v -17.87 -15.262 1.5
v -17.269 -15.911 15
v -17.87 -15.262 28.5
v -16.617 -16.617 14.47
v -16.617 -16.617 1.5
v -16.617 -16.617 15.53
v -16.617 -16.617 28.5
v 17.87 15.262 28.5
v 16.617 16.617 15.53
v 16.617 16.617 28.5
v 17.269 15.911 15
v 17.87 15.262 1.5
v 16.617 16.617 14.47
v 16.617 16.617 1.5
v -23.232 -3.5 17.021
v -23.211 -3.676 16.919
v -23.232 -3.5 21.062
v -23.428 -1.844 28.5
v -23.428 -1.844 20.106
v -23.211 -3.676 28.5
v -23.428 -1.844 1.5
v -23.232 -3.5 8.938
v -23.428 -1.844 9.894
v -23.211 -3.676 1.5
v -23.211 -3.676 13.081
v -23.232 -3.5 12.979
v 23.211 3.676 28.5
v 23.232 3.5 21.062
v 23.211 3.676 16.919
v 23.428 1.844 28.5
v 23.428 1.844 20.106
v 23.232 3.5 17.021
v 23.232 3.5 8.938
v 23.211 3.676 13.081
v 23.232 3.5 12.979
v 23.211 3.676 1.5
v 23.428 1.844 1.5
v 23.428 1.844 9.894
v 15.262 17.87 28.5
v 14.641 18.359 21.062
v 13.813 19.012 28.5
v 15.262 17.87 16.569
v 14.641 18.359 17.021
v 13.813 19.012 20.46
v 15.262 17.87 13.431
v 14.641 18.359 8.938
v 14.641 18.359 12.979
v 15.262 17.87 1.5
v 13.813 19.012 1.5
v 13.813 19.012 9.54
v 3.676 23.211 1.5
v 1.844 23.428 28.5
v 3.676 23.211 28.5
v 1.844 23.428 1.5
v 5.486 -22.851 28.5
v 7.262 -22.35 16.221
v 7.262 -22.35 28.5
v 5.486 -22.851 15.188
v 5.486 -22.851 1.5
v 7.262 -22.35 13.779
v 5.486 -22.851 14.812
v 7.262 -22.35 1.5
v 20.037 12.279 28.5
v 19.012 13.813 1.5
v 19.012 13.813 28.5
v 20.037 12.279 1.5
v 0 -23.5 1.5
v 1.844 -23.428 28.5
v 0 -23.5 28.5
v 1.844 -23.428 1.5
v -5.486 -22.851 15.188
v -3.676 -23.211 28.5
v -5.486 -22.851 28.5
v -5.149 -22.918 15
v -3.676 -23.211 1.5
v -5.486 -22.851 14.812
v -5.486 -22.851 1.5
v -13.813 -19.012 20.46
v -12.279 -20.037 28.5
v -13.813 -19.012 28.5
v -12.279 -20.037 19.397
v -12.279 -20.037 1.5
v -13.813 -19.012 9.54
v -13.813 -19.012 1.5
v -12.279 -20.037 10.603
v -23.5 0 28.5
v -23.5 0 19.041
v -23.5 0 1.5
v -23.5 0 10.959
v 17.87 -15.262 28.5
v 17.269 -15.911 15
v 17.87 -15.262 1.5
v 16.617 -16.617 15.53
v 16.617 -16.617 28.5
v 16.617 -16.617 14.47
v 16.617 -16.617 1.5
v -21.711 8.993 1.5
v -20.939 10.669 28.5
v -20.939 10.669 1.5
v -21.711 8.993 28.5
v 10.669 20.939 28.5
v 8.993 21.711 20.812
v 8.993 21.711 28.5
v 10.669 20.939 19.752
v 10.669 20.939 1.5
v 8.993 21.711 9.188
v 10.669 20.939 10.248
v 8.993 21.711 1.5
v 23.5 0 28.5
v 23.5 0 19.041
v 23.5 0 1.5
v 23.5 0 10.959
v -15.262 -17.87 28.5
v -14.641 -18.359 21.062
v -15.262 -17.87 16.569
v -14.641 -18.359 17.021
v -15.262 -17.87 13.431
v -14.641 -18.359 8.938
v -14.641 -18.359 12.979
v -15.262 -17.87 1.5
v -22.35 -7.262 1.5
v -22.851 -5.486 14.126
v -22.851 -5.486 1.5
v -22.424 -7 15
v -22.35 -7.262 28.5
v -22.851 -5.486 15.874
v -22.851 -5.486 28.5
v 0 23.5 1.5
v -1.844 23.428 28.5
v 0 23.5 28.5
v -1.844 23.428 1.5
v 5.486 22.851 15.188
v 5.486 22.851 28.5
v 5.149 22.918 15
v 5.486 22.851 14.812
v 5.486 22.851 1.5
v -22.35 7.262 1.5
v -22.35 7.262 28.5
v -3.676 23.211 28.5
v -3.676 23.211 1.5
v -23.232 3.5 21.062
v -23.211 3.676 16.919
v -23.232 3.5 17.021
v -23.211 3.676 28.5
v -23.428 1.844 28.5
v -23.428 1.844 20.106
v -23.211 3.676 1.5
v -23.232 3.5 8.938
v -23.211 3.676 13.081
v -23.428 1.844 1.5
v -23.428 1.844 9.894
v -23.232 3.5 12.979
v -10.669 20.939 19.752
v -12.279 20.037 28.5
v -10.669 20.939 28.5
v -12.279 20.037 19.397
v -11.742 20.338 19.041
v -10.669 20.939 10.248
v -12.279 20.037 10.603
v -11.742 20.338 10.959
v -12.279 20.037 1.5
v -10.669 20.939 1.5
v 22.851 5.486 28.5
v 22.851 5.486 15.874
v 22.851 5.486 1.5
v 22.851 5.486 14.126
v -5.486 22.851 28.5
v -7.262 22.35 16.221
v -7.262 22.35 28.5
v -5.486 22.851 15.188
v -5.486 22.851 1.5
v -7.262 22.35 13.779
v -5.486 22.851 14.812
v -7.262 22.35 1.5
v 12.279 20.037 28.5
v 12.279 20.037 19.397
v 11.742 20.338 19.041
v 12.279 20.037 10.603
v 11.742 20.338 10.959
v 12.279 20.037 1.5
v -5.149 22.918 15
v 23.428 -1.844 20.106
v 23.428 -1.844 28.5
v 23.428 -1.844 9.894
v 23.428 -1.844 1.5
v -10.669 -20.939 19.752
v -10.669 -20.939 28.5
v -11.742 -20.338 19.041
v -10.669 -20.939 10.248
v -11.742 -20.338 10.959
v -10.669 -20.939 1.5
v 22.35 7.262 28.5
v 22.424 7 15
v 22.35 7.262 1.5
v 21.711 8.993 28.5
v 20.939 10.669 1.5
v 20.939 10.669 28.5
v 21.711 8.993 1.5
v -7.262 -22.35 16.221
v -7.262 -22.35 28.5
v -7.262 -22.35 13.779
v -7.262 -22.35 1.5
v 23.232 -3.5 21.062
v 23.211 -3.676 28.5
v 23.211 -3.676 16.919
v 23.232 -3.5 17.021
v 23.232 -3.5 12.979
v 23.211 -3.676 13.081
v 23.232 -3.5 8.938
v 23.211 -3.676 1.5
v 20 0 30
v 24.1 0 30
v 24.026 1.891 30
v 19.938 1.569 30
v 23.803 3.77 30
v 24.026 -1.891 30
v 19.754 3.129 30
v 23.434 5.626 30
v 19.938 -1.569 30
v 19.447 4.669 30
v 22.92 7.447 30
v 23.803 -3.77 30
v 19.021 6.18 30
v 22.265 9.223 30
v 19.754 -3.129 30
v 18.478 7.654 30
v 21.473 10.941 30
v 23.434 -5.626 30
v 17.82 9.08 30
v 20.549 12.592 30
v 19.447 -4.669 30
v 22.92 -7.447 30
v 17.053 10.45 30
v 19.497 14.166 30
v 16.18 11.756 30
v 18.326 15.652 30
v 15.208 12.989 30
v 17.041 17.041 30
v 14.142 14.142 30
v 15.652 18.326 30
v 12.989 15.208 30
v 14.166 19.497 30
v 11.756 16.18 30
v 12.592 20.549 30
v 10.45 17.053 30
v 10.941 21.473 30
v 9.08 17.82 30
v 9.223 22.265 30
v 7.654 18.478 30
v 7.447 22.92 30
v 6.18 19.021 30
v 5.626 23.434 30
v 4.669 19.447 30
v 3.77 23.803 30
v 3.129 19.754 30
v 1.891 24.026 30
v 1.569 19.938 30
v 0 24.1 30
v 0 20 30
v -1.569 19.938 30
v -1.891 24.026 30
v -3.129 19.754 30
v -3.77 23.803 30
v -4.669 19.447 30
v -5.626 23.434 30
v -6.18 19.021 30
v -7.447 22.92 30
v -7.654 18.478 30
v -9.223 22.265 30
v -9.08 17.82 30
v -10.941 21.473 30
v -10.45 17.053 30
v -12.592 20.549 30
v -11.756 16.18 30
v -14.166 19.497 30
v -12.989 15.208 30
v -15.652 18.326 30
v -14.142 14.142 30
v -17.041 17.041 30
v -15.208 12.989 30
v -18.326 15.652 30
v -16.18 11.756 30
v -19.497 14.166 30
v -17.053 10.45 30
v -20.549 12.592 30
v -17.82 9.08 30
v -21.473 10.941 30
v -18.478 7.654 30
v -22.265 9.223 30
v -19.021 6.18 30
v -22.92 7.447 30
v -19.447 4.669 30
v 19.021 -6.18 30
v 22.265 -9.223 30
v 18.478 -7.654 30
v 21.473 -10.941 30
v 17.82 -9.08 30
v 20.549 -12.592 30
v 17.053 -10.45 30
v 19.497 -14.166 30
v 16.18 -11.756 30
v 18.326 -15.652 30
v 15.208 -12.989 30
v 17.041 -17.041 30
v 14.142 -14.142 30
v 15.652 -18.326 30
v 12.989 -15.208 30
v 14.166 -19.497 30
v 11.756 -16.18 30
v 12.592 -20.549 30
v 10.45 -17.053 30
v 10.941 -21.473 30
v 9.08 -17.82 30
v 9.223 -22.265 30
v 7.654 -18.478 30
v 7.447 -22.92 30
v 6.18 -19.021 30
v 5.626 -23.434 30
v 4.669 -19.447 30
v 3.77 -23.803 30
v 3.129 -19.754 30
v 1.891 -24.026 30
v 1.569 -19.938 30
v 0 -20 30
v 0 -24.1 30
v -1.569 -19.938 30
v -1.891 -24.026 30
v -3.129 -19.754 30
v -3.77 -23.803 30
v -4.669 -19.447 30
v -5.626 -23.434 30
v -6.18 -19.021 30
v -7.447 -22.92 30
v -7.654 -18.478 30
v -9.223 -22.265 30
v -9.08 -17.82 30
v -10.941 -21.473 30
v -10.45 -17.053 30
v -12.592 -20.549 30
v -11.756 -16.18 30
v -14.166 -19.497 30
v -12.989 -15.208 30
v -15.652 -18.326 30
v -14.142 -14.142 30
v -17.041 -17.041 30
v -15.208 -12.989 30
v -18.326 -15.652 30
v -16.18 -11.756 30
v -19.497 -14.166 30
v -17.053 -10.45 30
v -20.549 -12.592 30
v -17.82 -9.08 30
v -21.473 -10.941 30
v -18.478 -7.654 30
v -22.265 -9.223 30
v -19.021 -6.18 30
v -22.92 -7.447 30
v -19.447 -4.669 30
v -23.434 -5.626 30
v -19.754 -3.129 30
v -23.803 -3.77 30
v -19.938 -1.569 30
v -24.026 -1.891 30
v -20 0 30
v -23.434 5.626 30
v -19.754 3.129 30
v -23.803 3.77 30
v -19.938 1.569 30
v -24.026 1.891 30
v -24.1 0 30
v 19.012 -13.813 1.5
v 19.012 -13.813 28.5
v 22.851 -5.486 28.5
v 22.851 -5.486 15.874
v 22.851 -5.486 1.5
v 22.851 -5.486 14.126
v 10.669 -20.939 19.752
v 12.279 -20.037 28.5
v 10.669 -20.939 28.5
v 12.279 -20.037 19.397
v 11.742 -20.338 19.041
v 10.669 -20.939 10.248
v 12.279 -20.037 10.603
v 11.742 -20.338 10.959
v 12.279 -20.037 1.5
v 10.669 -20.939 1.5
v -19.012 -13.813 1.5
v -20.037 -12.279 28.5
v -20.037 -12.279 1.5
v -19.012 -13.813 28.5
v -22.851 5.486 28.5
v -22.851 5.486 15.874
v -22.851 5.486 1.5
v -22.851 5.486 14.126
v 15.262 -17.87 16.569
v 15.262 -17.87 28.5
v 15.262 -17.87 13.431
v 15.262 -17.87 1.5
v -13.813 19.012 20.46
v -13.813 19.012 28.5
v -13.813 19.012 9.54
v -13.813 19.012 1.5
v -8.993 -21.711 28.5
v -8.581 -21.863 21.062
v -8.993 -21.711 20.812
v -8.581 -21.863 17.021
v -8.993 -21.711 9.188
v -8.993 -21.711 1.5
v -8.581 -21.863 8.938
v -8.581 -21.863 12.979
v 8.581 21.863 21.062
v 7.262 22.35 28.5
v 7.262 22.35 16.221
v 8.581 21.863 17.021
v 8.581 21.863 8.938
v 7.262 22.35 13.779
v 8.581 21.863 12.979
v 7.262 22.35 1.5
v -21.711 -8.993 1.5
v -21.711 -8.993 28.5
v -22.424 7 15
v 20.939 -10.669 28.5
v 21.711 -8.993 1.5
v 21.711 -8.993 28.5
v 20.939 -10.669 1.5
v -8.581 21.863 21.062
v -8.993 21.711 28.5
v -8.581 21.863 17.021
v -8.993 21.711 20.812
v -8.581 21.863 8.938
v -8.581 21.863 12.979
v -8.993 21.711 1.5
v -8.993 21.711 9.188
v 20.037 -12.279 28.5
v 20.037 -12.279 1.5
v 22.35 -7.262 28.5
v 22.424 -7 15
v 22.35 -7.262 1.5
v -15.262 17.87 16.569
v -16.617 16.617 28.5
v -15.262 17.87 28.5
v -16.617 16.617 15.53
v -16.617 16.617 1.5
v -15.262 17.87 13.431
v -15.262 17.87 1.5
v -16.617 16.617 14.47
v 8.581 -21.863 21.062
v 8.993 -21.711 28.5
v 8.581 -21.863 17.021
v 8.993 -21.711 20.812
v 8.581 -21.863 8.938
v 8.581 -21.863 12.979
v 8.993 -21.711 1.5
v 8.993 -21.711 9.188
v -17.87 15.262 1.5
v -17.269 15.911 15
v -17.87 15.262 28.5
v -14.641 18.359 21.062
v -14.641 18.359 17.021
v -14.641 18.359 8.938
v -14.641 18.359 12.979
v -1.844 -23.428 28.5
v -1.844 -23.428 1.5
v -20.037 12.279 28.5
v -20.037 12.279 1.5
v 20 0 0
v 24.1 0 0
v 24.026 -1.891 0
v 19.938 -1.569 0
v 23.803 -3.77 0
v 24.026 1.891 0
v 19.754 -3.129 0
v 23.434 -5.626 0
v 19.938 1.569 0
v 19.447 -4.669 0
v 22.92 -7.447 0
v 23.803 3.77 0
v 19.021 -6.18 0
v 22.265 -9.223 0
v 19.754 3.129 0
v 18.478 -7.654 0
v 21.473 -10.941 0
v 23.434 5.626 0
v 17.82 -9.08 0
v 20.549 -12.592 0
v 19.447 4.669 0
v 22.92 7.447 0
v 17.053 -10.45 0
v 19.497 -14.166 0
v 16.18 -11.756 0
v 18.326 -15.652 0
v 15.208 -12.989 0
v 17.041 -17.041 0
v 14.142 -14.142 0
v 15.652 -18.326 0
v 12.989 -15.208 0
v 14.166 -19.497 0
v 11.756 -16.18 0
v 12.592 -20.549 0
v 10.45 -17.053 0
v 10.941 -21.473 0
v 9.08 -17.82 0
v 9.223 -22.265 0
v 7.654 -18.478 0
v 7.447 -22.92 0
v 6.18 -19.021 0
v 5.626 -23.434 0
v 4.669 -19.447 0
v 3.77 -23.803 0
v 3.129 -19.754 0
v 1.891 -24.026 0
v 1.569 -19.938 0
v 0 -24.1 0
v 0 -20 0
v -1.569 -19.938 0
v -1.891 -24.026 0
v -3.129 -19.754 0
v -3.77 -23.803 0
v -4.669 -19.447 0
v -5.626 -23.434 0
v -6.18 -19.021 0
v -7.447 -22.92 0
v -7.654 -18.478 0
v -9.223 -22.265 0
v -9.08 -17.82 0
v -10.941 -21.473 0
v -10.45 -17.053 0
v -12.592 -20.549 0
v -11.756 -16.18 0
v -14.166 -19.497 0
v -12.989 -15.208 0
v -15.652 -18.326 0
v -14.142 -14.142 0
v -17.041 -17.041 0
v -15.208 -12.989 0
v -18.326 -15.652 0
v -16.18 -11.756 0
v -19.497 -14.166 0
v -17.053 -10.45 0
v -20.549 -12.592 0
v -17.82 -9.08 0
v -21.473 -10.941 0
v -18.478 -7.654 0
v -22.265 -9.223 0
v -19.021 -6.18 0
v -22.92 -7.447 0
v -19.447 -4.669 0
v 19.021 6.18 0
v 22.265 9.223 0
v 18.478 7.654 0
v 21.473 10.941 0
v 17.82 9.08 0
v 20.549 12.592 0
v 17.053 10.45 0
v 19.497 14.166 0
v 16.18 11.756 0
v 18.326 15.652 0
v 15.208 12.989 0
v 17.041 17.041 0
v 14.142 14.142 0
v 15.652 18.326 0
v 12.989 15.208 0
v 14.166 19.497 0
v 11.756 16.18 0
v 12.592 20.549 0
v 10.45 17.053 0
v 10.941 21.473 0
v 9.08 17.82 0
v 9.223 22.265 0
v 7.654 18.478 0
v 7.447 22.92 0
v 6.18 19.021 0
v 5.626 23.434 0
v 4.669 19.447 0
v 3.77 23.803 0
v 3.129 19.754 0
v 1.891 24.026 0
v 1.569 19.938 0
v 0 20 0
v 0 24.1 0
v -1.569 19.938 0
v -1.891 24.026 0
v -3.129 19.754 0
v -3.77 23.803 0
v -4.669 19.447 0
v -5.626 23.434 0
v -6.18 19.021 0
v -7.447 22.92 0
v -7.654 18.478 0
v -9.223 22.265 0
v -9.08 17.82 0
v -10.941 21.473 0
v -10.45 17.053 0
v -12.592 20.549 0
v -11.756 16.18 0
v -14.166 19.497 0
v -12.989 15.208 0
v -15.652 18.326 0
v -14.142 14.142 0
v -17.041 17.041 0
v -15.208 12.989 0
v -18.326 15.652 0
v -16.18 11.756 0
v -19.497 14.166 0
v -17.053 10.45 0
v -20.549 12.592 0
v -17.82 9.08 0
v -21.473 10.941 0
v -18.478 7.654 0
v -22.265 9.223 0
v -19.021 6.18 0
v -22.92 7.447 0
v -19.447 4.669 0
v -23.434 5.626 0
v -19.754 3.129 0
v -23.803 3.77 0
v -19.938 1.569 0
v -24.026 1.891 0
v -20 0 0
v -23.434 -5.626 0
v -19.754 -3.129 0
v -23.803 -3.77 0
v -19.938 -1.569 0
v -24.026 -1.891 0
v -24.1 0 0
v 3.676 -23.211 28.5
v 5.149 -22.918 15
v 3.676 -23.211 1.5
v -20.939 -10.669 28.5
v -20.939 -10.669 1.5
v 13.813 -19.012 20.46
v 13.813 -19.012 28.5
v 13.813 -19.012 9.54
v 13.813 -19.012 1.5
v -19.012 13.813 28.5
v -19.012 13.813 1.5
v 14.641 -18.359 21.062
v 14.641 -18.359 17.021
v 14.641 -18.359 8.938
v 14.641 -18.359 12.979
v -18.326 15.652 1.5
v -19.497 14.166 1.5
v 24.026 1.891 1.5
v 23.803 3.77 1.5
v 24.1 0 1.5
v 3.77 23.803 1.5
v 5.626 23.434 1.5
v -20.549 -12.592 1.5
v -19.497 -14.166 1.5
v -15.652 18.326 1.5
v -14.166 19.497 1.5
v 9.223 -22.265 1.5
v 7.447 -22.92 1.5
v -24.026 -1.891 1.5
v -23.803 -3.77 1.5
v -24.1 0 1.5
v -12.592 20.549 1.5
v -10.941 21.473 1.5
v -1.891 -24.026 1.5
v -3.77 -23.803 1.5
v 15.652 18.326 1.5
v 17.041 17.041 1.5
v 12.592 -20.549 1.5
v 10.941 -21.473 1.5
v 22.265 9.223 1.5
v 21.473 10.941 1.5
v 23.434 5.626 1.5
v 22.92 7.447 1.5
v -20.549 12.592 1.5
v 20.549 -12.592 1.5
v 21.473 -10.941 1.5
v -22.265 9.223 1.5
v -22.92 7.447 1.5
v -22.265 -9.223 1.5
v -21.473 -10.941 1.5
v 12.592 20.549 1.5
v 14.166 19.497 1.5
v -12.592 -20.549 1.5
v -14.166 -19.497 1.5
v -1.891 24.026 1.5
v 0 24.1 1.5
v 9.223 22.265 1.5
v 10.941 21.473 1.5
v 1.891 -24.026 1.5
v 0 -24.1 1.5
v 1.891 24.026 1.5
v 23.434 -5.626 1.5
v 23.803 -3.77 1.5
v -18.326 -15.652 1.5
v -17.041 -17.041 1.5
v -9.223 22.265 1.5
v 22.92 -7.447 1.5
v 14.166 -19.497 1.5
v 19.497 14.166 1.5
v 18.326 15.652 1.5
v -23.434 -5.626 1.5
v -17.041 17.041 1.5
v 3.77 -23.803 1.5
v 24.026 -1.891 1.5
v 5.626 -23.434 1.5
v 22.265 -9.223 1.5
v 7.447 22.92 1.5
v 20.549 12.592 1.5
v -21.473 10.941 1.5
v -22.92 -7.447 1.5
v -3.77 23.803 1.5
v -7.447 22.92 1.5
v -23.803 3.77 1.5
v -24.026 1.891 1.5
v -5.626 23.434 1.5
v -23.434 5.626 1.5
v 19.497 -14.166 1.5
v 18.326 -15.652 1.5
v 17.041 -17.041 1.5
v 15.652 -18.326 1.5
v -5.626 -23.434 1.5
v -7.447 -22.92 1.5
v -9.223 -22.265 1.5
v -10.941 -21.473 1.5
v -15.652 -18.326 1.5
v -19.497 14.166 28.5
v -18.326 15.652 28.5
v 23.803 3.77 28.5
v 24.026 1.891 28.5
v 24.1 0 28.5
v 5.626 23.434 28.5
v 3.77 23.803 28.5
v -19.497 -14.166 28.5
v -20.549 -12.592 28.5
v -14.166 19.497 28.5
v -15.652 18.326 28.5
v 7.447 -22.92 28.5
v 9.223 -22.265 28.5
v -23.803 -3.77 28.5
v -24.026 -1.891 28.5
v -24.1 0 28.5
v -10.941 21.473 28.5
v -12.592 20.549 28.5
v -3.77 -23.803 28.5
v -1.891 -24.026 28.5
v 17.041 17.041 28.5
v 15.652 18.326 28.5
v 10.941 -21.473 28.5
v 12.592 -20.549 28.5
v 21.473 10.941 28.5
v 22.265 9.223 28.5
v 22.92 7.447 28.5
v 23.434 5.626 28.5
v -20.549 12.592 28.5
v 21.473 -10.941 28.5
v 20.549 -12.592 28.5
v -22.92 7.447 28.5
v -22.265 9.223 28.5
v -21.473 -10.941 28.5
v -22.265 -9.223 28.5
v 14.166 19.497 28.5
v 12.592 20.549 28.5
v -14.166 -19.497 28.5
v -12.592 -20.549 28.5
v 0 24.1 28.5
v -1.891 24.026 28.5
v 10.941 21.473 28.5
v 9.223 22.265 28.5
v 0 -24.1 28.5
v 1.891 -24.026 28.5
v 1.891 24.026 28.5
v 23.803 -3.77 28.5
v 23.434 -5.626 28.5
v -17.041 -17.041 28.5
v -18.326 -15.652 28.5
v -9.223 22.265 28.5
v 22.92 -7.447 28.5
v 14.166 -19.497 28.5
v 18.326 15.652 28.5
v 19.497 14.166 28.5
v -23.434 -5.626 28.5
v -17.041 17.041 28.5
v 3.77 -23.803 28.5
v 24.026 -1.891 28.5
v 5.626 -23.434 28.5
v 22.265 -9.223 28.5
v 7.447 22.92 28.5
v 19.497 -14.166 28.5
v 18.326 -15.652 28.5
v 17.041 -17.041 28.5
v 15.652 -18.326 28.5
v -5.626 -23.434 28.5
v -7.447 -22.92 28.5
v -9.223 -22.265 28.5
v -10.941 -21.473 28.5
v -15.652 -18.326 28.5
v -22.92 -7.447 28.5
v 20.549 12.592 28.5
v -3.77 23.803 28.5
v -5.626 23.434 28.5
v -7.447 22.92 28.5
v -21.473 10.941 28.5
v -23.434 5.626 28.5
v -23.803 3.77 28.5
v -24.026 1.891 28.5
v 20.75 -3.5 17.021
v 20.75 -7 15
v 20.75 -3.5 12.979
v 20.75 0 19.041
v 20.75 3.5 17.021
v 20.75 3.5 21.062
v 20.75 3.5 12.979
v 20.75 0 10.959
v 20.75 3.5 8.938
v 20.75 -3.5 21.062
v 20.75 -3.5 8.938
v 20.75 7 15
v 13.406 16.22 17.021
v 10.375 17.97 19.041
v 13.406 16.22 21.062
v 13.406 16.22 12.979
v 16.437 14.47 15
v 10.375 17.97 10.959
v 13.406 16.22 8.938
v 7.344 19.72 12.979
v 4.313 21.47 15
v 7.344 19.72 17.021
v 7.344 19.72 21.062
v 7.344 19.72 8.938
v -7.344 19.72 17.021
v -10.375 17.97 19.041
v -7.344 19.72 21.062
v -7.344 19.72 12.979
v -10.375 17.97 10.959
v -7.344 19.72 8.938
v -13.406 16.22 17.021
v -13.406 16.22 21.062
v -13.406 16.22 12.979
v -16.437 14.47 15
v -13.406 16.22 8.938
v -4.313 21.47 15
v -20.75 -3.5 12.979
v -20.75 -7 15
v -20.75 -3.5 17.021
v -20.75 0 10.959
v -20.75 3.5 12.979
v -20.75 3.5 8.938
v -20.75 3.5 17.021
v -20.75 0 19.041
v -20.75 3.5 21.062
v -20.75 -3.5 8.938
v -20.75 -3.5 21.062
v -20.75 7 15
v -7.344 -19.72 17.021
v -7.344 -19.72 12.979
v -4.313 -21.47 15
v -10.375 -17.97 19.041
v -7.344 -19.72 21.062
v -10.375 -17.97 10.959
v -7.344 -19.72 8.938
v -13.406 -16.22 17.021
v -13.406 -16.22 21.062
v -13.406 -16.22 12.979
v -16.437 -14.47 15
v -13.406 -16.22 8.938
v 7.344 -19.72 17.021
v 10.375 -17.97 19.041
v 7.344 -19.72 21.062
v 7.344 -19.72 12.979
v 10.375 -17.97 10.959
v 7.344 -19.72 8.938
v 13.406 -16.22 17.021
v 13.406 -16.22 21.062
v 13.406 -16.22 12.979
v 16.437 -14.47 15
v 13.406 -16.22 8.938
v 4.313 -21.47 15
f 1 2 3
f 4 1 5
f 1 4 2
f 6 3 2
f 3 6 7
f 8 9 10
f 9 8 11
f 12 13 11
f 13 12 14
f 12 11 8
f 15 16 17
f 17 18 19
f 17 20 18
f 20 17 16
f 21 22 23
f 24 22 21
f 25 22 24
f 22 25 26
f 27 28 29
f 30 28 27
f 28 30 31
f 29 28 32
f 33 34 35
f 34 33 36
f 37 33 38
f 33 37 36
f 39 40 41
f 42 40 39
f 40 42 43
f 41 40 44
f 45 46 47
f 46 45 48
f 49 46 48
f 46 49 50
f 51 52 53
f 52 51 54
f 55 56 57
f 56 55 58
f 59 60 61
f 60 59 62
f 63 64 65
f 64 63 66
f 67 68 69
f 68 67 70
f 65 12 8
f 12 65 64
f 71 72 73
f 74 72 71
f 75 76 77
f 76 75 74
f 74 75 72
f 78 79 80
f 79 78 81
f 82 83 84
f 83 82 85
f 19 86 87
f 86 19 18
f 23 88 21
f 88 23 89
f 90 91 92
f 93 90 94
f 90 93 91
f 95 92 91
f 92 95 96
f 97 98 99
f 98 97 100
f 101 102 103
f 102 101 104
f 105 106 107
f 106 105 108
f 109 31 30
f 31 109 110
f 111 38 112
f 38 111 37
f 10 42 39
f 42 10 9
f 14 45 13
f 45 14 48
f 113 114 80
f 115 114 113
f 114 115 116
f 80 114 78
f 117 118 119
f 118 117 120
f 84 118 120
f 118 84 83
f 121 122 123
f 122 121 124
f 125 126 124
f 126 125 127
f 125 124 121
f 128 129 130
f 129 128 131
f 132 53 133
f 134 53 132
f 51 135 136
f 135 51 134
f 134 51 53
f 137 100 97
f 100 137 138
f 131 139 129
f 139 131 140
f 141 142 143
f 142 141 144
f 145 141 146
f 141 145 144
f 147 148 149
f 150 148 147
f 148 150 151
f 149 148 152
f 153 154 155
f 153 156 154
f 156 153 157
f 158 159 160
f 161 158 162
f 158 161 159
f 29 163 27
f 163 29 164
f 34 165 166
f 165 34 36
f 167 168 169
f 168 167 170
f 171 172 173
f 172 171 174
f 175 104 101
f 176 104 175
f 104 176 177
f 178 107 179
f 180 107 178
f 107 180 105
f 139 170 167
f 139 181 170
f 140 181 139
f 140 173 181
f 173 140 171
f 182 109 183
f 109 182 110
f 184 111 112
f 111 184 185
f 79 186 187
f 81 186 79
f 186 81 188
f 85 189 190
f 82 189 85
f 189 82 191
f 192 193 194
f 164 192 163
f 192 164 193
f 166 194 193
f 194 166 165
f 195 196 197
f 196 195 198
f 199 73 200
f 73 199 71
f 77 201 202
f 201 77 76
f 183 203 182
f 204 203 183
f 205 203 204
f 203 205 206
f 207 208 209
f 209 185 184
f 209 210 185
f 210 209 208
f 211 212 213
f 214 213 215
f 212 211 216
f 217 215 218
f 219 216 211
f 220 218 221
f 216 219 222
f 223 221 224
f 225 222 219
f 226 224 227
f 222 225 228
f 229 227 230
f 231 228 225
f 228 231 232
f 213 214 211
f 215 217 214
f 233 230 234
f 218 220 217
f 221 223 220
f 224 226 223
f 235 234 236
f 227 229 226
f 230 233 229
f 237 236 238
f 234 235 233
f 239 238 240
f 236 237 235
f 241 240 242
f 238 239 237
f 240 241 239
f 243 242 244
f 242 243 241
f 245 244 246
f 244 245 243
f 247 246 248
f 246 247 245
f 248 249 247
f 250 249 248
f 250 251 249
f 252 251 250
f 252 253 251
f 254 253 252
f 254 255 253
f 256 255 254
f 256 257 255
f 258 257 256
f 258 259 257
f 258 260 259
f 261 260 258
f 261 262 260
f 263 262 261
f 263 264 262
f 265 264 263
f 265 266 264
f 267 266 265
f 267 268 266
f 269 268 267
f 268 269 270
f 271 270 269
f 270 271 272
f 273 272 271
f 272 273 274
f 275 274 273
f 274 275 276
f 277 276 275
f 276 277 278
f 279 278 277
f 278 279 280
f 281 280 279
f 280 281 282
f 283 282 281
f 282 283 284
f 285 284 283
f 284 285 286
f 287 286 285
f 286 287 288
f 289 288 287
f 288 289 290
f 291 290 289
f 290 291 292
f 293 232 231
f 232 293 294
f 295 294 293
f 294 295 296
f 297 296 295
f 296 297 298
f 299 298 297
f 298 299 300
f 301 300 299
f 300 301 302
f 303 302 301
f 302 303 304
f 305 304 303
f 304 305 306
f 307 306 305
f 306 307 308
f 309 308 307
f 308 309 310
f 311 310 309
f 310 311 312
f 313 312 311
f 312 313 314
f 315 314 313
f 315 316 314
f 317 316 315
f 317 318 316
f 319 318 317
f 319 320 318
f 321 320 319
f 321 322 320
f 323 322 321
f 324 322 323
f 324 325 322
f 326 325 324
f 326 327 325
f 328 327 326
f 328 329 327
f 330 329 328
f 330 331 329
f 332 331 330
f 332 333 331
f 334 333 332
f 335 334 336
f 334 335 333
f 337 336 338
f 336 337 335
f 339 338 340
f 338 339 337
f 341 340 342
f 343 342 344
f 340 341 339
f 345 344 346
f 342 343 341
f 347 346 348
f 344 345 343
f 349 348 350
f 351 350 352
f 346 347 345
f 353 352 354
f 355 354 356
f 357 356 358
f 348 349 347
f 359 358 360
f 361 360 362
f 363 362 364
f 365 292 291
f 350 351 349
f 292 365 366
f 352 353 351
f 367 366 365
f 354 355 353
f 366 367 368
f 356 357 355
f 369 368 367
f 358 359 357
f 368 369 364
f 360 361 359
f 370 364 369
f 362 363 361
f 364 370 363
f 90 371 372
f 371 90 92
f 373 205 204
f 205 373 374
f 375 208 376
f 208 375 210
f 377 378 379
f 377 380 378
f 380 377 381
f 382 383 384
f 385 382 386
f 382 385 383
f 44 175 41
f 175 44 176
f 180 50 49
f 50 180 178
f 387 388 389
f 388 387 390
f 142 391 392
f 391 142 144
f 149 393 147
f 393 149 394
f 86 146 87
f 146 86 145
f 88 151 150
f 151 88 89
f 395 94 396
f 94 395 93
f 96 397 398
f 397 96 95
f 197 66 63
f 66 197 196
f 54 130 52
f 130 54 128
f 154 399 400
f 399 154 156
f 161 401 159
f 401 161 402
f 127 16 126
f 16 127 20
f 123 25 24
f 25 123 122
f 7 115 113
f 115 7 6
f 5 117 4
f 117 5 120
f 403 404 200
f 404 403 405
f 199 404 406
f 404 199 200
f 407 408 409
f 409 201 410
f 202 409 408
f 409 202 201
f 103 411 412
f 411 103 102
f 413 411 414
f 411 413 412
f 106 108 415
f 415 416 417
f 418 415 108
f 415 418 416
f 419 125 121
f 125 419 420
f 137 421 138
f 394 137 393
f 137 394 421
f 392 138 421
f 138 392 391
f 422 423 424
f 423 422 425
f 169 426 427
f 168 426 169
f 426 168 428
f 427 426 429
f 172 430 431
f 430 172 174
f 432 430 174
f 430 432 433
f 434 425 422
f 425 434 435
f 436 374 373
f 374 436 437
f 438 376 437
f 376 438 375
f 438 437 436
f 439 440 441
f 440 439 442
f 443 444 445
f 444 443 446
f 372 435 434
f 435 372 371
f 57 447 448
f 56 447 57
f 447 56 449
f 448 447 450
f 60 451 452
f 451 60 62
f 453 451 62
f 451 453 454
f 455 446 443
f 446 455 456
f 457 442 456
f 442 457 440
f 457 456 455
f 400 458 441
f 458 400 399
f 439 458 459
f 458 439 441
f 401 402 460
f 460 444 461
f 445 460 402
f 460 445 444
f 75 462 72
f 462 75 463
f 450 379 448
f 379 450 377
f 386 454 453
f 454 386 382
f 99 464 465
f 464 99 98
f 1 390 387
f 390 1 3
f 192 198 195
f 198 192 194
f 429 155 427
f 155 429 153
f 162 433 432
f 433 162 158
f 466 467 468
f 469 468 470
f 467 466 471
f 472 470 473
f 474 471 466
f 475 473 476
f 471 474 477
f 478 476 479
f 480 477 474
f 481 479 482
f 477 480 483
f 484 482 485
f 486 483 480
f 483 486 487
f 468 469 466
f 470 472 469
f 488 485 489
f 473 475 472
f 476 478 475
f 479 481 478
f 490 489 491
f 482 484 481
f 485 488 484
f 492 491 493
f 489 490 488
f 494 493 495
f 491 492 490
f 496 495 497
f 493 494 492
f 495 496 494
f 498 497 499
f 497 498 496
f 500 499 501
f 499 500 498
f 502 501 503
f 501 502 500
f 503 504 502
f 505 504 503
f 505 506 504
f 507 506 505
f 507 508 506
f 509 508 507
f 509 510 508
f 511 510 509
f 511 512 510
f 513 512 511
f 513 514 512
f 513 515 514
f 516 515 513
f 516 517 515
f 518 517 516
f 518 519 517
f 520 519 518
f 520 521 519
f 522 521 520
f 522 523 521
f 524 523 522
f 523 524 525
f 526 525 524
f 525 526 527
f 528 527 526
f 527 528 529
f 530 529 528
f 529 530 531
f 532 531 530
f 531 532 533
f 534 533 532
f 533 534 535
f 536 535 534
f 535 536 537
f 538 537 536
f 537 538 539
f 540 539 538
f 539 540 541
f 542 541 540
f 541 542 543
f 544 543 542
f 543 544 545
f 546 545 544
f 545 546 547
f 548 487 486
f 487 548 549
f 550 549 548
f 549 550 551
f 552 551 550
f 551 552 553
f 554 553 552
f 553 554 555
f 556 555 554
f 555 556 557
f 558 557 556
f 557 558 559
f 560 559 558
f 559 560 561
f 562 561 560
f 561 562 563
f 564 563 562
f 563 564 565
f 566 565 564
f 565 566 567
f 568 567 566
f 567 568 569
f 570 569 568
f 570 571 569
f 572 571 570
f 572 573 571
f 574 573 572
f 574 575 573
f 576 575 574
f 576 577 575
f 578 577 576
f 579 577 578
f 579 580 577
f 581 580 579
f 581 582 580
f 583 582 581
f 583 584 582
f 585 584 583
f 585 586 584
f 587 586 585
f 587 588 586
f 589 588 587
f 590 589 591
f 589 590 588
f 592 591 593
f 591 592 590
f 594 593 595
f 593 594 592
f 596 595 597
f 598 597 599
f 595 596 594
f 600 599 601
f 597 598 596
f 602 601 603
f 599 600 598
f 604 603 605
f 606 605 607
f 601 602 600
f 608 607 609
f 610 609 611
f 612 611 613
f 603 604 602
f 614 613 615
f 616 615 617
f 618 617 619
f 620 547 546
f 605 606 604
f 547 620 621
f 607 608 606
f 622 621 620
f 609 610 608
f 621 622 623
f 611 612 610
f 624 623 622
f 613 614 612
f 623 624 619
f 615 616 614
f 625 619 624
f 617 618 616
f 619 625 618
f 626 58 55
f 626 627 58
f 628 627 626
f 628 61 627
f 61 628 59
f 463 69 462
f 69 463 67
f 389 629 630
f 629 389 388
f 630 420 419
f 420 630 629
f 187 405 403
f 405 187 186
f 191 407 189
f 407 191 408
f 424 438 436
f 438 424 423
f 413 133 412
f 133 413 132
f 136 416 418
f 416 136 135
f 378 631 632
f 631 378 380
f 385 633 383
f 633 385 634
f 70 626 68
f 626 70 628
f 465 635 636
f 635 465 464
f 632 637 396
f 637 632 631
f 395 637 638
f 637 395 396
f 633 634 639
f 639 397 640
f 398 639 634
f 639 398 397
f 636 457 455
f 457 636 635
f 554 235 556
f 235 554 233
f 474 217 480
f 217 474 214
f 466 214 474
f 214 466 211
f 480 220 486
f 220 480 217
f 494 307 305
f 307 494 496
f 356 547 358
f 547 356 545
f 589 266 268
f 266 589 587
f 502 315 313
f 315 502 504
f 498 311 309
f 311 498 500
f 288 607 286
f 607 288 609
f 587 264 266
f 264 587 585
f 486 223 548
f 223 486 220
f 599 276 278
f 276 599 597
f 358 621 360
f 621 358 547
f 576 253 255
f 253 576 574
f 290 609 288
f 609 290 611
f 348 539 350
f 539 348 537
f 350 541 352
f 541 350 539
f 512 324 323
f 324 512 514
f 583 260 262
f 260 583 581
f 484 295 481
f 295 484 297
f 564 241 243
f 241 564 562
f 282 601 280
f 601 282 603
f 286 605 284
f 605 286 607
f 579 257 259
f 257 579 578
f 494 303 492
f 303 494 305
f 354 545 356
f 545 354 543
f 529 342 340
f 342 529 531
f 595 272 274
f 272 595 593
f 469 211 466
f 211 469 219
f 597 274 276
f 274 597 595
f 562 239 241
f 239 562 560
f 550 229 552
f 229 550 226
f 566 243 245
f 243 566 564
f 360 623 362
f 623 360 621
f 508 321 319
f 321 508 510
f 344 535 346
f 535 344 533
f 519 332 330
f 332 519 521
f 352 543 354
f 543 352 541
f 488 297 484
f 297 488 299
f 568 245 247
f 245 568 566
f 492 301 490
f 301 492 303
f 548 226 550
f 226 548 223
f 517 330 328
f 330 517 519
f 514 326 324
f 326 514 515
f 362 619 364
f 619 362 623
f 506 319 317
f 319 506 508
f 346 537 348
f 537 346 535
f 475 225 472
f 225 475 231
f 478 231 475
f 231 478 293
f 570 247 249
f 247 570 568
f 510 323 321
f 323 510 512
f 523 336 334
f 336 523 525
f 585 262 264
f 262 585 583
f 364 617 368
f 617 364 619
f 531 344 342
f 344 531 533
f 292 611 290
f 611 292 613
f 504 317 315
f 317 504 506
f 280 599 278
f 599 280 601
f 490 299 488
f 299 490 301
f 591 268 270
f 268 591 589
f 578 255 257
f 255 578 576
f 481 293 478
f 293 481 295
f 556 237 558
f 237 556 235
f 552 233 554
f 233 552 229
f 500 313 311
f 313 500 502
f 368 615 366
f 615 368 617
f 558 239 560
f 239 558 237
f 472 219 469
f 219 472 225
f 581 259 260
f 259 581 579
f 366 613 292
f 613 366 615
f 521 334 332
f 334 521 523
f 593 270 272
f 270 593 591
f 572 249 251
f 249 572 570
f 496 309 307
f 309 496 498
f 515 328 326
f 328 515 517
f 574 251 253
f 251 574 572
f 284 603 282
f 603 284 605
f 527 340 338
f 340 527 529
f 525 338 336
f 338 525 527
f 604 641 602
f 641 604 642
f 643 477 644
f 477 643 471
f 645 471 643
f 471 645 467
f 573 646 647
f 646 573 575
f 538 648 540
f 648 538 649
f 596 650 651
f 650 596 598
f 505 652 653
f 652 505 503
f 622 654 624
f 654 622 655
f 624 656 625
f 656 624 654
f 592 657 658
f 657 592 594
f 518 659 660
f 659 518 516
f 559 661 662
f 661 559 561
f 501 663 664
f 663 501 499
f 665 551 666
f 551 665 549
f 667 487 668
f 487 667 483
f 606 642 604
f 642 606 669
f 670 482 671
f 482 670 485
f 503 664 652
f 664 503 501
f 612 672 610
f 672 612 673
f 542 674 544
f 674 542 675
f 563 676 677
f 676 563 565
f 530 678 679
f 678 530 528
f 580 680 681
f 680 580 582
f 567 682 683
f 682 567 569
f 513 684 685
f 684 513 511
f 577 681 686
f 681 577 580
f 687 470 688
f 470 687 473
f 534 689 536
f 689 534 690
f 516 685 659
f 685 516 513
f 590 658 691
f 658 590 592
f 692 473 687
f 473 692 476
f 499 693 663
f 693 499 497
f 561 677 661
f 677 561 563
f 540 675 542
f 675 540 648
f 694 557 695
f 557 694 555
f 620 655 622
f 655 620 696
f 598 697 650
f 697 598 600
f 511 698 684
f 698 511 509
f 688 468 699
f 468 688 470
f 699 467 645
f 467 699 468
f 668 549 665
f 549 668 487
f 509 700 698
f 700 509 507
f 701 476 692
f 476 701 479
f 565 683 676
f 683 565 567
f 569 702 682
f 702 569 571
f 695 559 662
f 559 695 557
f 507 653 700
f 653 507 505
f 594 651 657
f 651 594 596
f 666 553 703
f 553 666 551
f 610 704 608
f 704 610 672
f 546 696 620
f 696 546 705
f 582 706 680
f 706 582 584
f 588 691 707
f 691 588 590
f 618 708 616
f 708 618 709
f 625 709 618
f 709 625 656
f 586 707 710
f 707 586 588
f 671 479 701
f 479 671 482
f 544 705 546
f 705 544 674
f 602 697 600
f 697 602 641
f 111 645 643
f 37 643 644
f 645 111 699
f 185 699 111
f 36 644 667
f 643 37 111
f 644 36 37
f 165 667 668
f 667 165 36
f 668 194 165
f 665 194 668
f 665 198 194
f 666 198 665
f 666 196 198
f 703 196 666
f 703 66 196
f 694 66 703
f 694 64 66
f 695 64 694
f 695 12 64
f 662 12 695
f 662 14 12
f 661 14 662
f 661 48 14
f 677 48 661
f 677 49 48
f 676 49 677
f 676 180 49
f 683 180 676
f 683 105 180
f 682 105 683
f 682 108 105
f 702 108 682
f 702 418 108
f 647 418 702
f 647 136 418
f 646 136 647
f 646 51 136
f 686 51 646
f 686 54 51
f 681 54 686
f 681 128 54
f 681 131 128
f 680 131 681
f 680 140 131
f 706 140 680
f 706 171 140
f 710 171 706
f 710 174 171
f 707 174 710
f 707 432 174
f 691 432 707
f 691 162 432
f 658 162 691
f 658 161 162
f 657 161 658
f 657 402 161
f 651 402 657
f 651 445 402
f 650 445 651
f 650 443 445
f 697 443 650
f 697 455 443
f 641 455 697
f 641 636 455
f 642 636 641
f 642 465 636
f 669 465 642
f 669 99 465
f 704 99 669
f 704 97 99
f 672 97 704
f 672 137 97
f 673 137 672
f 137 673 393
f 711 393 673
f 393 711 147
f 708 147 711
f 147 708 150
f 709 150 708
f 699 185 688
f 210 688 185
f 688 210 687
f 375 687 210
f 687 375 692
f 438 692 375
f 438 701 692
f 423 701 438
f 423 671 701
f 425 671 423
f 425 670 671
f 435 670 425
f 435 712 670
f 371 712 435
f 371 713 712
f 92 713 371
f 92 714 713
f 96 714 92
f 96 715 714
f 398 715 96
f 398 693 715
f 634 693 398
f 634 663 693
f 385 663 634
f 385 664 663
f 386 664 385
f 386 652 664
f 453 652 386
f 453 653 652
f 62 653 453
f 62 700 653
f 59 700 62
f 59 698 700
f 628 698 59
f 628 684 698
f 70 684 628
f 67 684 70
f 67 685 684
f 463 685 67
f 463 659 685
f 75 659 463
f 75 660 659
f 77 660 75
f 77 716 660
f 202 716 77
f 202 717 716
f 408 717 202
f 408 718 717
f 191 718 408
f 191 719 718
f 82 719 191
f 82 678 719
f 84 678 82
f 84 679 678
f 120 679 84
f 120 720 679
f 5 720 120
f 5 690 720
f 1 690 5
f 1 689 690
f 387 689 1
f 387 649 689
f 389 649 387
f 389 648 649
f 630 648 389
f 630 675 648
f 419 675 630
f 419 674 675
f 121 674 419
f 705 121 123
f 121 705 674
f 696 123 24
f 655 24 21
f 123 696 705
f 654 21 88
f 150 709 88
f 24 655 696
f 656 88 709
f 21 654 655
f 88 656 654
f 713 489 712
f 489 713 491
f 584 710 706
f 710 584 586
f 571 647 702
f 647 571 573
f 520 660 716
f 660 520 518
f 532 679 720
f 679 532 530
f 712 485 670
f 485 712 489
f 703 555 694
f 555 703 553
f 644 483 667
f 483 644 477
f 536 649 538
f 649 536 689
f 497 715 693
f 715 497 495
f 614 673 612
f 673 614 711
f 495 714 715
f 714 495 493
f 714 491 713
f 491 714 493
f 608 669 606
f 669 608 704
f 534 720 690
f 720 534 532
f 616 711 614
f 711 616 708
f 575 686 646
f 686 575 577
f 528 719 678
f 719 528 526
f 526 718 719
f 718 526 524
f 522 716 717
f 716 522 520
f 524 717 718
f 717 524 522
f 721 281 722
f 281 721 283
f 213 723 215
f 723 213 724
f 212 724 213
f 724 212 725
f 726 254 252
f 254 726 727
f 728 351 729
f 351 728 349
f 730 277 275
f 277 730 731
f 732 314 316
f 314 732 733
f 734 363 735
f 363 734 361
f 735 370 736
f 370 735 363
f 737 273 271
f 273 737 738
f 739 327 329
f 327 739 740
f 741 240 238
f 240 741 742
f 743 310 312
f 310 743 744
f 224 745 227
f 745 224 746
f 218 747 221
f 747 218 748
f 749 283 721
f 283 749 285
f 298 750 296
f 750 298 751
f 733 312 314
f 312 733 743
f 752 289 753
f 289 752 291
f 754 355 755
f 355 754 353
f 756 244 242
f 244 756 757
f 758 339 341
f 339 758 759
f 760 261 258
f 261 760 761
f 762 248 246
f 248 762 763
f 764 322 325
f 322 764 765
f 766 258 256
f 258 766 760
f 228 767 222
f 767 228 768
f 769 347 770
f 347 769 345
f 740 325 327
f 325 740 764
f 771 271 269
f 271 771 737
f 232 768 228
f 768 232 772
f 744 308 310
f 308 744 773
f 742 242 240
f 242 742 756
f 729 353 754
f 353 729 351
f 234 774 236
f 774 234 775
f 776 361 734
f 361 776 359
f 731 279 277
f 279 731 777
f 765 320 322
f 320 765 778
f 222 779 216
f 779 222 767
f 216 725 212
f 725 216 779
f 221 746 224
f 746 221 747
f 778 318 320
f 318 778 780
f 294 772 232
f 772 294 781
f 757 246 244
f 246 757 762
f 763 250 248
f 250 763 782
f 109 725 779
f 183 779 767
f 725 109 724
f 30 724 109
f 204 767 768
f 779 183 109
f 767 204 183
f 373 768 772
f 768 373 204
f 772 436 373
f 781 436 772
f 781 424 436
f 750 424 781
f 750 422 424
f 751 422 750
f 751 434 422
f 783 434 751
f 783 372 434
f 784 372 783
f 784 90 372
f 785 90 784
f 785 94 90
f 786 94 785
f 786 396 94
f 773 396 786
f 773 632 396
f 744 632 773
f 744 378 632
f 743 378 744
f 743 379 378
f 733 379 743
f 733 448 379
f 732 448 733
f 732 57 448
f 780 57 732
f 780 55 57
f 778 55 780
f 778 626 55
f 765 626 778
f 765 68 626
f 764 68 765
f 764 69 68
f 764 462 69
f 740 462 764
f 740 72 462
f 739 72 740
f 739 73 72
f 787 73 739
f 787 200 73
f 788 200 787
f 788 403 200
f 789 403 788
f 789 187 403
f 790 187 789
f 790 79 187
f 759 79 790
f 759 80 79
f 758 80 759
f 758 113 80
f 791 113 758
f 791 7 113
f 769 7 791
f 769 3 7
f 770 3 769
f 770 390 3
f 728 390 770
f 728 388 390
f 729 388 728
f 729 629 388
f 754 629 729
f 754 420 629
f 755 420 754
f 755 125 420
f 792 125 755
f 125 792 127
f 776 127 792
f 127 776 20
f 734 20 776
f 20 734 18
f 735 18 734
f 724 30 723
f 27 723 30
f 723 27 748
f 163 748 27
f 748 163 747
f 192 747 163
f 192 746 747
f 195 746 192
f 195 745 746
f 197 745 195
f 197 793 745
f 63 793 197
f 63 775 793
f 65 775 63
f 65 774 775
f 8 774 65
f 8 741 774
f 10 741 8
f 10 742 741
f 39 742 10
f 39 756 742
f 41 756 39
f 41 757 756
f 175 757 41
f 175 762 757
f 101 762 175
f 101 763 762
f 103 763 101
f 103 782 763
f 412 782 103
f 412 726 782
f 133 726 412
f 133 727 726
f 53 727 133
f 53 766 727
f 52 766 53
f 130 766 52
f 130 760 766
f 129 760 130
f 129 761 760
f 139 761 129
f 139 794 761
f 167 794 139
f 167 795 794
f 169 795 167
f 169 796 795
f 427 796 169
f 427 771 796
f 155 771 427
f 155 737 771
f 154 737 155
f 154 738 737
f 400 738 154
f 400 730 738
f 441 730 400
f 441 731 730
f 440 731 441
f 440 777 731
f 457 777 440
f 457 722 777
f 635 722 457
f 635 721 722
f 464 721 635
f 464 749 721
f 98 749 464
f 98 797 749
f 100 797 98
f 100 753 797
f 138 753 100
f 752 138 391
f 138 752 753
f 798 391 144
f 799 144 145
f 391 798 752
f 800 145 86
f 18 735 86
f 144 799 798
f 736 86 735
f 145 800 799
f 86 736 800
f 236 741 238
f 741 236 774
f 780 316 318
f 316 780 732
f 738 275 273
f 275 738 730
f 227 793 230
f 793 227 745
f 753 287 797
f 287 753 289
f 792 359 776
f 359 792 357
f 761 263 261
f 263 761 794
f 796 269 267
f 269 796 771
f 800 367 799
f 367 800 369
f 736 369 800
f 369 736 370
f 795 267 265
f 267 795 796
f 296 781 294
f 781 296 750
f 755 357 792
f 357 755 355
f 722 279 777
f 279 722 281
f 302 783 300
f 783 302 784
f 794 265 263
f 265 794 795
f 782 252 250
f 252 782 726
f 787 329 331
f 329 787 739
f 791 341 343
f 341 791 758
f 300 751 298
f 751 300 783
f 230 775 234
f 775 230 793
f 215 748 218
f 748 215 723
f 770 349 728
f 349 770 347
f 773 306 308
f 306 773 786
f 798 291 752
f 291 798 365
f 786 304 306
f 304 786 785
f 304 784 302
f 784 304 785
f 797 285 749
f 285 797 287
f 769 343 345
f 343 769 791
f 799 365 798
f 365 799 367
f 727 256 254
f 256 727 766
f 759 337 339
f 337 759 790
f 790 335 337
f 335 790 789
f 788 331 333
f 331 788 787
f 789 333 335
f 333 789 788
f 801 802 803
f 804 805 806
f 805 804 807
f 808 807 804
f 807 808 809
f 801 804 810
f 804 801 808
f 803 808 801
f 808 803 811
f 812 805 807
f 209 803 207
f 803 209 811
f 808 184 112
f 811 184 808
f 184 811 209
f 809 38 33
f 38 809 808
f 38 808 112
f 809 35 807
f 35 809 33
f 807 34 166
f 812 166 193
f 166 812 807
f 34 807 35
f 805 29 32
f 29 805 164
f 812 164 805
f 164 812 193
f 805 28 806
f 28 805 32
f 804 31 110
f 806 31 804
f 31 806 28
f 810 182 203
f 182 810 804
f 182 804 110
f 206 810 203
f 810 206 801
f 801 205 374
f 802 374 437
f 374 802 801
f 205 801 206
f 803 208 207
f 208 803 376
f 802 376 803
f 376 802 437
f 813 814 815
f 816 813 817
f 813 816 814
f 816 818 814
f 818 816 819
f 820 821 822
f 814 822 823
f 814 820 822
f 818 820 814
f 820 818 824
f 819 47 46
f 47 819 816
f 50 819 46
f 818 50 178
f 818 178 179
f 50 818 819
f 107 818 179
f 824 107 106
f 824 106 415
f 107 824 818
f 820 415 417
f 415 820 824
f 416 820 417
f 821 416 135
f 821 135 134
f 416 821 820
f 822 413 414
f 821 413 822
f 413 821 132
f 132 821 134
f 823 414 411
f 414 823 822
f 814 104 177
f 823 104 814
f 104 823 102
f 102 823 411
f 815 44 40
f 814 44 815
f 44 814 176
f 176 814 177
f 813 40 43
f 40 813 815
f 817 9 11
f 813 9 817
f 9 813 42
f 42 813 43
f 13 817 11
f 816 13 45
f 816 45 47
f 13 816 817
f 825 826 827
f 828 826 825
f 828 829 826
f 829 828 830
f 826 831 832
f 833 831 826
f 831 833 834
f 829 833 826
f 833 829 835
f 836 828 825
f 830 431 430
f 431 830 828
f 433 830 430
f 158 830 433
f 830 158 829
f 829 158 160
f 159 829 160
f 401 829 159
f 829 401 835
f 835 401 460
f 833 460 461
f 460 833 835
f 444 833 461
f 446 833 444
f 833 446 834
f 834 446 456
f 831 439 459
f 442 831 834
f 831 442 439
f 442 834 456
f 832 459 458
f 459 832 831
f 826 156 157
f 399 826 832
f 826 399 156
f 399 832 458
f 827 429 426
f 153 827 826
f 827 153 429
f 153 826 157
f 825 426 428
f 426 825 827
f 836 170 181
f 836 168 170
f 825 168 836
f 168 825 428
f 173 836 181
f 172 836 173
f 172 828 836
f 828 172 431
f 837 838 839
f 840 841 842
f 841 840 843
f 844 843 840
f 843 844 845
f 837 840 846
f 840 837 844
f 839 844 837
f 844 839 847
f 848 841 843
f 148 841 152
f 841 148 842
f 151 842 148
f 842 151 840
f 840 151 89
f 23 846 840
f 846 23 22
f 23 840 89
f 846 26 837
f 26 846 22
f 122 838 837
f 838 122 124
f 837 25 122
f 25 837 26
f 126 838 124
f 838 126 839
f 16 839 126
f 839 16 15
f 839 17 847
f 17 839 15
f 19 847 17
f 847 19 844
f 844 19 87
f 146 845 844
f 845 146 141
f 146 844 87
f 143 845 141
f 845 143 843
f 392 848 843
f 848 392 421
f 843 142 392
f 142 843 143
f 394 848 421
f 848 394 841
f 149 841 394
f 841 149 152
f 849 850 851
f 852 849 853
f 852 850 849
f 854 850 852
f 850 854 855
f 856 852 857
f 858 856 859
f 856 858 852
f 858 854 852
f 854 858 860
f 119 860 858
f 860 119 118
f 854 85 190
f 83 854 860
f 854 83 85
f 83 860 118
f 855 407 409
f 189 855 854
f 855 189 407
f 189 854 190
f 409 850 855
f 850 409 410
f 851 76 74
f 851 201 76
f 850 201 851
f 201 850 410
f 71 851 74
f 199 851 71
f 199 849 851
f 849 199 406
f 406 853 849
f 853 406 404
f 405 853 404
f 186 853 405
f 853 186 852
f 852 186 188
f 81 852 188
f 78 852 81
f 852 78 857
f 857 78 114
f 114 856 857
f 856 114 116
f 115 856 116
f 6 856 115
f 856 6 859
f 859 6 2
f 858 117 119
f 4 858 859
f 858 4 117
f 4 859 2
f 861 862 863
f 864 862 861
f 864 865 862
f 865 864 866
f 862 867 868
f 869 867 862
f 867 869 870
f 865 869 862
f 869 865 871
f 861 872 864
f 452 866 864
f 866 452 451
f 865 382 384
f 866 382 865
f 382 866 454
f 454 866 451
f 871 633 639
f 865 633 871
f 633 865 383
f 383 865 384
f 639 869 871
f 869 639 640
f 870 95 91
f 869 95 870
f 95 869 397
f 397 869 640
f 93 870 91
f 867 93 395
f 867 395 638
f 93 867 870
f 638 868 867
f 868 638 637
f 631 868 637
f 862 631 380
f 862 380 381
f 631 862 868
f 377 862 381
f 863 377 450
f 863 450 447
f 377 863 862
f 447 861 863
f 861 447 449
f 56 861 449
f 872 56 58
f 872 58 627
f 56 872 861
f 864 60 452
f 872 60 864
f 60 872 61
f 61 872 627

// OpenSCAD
// Passover Star of David Napkin Ring
// A napkin ring with Star of David cutouts around the band

$fn = 80;

// Napkin ring parameters
ring_inner_d = 40;
ring_height = 30;
ring_wall = 3.5;

module napkin_ring_base() {
    difference() {
        cylinder(d = ring_inner_d + 2 * ring_wall, h = ring_height);
        translate([0, 0, -1])
            cylinder(d = ring_inner_d, h = ring_height + 2);
    }
}

// 2D Star of David (two overlapping triangles)
module star_of_david_2d(size) {
    // Upward triangle
    polygon(points = [
        [size * cos(90), size * sin(90)],
        [size * cos(210), size * sin(210)],
        [size * cos(330), size * sin(330)]
    ]);
    // Downward triangle
    polygon(points = [
        [size * cos(270), size * sin(270)],
        [size * cos(30), size * sin(30)],
        [size * cos(150), size * sin(150)]
    ]);
}

// Cut stars around the ring
module star_cutouts() {
    outer_r = (ring_inner_d + 2 * ring_wall) / 2;
    num_stars = 6;
    star_size = 7;

    for (i = [0:num_stars-1]) {
        angle = i * 360 / num_stars;
        rotate([0, 0, angle])
            translate([outer_r, 0, ring_height / 2])
                rotate([0, 90, 0])
                    linear_extrude(height = ring_wall + 2, center = true)
                        star_of_david_2d(star_size);
    }
}

// Decorative border lines at top and bottom
module border_rings() {
    outer_r = (ring_inner_d + 2 * ring_wall) / 2;

    for (z = [2, ring_height - 2]) {
        difference() {
            cylinder(d = ring_inner_d + 2 * ring_wall + 1, h = 1.5, center = true);
            cylinder(d = ring_inner_d + 2 * ring_wall - 1, h = 2, center = true);
            translate([0, 0, 0])
                cylinder(d = ring_inner_d, h = 4, center = true);
        }
    }
}

// Assemble
difference() {
    union() {
        napkin_ring_base();
        // Top border
        translate([0, 0, ring_height - 1.5])
            difference() {
                cylinder(d = ring_inner_d + 2 * ring_wall + 1.2, h = 1.5);
                translate([0, 0, -0.5])
                    cylinder(d = ring_inner_d, h = 2.5);
            }
        // Bottom border
        difference() {
            cylinder(d = ring_inner_d + 2 * ring_wall + 1.2, h = 1.5);
            translate([0, 0, -0.5])
                cylinder(d = ring_inner_d, h = 2.5);
        }
    }
    star_cutouts();
}
